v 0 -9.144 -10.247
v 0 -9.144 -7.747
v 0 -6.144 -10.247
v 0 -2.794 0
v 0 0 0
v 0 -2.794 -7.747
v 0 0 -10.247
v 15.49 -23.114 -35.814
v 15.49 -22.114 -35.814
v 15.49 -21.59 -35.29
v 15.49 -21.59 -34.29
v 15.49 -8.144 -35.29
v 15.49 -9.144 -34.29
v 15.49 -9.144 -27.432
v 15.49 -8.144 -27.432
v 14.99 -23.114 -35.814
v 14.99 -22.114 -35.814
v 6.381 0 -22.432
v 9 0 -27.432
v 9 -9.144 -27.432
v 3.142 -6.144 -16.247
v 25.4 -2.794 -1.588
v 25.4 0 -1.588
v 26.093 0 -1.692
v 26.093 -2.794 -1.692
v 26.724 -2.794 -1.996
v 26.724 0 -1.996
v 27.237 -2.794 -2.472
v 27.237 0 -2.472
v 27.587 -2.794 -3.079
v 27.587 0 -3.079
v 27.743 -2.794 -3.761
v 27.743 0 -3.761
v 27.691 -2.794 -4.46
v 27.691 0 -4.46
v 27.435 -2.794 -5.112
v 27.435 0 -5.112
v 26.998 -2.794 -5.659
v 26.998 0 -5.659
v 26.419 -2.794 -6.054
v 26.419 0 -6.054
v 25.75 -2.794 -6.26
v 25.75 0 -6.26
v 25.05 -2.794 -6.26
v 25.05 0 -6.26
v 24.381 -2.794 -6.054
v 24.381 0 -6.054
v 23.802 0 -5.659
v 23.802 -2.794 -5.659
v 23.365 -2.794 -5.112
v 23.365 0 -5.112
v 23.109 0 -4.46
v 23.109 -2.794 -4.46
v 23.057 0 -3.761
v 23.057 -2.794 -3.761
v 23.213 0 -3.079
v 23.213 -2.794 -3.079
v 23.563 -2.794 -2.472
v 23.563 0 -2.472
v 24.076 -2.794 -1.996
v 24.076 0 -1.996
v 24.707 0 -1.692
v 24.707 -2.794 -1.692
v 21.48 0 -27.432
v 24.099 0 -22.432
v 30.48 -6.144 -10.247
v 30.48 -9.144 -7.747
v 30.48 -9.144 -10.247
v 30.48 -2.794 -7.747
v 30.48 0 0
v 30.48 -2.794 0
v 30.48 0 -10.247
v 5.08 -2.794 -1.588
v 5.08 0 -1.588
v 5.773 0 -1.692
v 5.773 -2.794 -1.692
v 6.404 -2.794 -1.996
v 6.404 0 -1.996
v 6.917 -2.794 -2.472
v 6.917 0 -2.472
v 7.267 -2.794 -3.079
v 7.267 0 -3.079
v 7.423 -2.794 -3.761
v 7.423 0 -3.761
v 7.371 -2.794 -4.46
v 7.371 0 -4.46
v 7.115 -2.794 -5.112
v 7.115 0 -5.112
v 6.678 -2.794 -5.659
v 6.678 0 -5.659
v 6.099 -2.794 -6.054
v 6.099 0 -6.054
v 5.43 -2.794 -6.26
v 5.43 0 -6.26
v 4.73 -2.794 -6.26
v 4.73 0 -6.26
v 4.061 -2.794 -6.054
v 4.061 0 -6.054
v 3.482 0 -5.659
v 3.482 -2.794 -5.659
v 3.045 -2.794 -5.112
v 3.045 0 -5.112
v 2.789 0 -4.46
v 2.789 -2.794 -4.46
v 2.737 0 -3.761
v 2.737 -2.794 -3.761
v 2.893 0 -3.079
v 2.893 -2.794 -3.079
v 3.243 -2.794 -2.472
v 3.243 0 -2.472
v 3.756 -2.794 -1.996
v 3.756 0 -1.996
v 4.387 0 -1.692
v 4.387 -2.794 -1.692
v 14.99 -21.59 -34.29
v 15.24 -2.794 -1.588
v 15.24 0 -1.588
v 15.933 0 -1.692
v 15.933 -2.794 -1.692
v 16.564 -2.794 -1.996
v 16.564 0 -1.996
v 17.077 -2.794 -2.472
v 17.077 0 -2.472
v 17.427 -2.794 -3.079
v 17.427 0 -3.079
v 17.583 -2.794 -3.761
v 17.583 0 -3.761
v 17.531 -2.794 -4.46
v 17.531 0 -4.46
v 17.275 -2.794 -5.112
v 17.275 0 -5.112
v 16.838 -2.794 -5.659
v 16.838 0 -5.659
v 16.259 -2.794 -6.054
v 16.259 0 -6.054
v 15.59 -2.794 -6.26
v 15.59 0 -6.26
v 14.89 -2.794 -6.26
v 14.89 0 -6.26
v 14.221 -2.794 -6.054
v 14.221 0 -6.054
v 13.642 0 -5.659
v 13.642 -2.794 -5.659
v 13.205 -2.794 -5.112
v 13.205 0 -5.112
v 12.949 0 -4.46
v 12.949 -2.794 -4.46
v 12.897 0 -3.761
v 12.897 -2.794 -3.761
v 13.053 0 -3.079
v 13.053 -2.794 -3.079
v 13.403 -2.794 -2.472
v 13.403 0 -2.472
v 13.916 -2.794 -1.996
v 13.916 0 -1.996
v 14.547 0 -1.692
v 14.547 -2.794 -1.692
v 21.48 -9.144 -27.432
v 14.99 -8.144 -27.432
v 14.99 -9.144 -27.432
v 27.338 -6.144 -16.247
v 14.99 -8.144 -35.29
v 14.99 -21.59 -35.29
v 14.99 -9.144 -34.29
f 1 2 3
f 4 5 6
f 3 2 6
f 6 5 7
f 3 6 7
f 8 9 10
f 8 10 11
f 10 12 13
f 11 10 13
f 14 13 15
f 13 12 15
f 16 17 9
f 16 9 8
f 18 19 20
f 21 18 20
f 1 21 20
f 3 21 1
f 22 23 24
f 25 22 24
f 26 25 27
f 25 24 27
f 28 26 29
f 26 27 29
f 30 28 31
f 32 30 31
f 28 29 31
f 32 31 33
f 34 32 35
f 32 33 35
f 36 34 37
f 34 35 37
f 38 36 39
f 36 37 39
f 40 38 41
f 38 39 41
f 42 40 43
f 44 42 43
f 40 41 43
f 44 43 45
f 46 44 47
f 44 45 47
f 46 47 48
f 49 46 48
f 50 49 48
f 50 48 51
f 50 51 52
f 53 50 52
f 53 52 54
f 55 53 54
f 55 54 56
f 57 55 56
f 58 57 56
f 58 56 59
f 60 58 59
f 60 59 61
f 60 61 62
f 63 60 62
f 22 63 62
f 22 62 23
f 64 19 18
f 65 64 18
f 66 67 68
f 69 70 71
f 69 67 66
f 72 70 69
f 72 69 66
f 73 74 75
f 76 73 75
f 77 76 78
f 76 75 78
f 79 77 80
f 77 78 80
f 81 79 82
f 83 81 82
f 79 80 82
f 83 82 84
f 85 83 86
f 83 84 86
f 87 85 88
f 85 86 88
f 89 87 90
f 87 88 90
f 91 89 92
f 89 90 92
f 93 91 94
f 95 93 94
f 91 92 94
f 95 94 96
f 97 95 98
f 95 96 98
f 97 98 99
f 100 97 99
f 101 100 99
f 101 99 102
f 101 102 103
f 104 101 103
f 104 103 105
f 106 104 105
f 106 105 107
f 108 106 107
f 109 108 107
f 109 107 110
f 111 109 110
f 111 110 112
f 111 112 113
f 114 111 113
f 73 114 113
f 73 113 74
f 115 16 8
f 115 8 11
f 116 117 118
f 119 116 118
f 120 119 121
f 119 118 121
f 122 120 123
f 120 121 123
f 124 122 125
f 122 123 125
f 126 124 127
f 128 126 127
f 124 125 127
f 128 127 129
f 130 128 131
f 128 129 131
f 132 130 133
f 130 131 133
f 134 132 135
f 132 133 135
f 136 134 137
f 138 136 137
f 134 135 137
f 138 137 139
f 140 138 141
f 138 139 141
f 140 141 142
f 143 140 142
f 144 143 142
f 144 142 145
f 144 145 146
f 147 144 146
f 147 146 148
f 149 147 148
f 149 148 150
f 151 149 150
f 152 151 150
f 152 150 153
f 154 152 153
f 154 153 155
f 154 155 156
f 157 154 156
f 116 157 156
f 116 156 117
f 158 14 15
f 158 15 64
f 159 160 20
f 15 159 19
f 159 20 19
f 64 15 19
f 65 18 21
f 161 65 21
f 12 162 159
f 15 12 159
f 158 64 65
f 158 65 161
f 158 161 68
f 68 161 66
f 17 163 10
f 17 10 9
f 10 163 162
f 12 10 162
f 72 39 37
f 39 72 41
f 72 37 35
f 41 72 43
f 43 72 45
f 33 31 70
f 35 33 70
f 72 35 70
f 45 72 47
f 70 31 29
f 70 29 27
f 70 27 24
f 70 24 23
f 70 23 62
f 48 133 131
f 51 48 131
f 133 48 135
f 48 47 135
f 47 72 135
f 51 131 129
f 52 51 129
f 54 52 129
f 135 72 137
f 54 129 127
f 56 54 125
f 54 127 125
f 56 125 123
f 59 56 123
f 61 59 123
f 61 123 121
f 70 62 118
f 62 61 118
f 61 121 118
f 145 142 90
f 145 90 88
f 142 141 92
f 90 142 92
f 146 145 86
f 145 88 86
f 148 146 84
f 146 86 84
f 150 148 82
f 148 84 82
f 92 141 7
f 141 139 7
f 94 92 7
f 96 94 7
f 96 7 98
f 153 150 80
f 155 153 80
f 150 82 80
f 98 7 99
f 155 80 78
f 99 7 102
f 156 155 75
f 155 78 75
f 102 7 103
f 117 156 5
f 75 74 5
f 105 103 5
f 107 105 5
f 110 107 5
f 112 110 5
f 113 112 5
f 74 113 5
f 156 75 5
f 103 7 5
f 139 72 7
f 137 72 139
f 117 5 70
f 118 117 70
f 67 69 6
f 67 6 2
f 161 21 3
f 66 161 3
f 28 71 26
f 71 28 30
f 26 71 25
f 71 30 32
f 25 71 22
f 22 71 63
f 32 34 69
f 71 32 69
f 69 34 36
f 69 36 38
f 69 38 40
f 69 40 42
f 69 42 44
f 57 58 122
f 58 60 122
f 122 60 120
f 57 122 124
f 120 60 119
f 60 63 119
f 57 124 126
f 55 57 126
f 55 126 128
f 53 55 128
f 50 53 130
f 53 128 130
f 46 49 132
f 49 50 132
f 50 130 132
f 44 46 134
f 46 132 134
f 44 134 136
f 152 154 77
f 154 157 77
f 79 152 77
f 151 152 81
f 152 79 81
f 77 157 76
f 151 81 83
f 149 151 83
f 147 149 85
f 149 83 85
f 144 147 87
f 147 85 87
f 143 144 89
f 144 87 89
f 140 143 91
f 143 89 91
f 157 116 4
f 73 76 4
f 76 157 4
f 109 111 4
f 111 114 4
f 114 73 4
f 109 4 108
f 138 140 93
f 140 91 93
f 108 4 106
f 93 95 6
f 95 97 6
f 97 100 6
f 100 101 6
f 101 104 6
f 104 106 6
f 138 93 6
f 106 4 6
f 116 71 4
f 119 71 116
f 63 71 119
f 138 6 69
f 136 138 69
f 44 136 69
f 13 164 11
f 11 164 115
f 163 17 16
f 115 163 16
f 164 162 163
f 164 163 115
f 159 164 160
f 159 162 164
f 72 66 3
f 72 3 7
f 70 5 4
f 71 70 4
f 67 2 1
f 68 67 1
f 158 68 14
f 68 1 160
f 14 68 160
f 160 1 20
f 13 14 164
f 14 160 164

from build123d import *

# Parameters (mm, degrees)
BOSS_EXTRUDE1_DEPTH = 30.48
SKETCH2_R           = 2.3495
CUT_EXTRUDE1_DEPTH  = 10
BOSS_EXTRUDE2_START = 14.99
BOSS_EXTRUDE2_DEPTH = 0.5


with BuildPart() as part:
    # Sketch1 → Boss-Extrude1 (new body)
    with BuildSketch(Plane(origin=(0, 0, 0), x_dir=(0, 0, -1), z_dir=(1, 0, 0))):
        Polygon((10.247, 0), (0, 0), (0, -2.794), (7.747, -2.794), (7.747, -9.144), (27.432, -9.144), (27.432, -8.144), (27.432, 0), (22.432, 0), (16.247, -6.144), (10.247, -6.144), align=None)
    extrude(amount=BOSS_EXTRUDE1_DEPTH)

    # Sketch2 → Cut-Extrude1 (cut)
    with BuildSketch(Plane(origin=(0, 0, 0), x_dir=(1, 0, 0), z_dir=(0, 1, 0))):
        with Locations((5.08, 3.937)):
            Circle(SKETCH2_R)
        with Locations((15.24, 3.937)):
            Circle(SKETCH2_R)
        with Locations((25.4, 3.937)):
            Circle(SKETCH2_R)
        Polygon((9, 27.432), (0, 10.247), (0, 27.432), align=None)
        Polygon((21.48, 27.432), (30.48, 10.247), (30.48, 27.432), align=None)
    extrude(amount=-CUT_EXTRUDE1_DEPTH, mode=Mode.SUBTRACT)

    # Sketch1<4> → Boss-Extrude2 (add)
    with BuildSketch(Plane(origin=(0, 0, 0), x_dir=(0, 0, -1), z_dir=(1, 0, 0)).offset(BOSS_EXTRUDE2_START)):
        Polygon((27.432, -8.144), (27.432, -9.144), (34.29, -9.144), (34.29, -21.59), (35.814, -23.114), (35.814, -22.114), (35.29, -21.59), (35.29, -8.144), align=None)
    extrude(amount=BOSS_EXTRUDE2_DEPTH)


solid = part.part
